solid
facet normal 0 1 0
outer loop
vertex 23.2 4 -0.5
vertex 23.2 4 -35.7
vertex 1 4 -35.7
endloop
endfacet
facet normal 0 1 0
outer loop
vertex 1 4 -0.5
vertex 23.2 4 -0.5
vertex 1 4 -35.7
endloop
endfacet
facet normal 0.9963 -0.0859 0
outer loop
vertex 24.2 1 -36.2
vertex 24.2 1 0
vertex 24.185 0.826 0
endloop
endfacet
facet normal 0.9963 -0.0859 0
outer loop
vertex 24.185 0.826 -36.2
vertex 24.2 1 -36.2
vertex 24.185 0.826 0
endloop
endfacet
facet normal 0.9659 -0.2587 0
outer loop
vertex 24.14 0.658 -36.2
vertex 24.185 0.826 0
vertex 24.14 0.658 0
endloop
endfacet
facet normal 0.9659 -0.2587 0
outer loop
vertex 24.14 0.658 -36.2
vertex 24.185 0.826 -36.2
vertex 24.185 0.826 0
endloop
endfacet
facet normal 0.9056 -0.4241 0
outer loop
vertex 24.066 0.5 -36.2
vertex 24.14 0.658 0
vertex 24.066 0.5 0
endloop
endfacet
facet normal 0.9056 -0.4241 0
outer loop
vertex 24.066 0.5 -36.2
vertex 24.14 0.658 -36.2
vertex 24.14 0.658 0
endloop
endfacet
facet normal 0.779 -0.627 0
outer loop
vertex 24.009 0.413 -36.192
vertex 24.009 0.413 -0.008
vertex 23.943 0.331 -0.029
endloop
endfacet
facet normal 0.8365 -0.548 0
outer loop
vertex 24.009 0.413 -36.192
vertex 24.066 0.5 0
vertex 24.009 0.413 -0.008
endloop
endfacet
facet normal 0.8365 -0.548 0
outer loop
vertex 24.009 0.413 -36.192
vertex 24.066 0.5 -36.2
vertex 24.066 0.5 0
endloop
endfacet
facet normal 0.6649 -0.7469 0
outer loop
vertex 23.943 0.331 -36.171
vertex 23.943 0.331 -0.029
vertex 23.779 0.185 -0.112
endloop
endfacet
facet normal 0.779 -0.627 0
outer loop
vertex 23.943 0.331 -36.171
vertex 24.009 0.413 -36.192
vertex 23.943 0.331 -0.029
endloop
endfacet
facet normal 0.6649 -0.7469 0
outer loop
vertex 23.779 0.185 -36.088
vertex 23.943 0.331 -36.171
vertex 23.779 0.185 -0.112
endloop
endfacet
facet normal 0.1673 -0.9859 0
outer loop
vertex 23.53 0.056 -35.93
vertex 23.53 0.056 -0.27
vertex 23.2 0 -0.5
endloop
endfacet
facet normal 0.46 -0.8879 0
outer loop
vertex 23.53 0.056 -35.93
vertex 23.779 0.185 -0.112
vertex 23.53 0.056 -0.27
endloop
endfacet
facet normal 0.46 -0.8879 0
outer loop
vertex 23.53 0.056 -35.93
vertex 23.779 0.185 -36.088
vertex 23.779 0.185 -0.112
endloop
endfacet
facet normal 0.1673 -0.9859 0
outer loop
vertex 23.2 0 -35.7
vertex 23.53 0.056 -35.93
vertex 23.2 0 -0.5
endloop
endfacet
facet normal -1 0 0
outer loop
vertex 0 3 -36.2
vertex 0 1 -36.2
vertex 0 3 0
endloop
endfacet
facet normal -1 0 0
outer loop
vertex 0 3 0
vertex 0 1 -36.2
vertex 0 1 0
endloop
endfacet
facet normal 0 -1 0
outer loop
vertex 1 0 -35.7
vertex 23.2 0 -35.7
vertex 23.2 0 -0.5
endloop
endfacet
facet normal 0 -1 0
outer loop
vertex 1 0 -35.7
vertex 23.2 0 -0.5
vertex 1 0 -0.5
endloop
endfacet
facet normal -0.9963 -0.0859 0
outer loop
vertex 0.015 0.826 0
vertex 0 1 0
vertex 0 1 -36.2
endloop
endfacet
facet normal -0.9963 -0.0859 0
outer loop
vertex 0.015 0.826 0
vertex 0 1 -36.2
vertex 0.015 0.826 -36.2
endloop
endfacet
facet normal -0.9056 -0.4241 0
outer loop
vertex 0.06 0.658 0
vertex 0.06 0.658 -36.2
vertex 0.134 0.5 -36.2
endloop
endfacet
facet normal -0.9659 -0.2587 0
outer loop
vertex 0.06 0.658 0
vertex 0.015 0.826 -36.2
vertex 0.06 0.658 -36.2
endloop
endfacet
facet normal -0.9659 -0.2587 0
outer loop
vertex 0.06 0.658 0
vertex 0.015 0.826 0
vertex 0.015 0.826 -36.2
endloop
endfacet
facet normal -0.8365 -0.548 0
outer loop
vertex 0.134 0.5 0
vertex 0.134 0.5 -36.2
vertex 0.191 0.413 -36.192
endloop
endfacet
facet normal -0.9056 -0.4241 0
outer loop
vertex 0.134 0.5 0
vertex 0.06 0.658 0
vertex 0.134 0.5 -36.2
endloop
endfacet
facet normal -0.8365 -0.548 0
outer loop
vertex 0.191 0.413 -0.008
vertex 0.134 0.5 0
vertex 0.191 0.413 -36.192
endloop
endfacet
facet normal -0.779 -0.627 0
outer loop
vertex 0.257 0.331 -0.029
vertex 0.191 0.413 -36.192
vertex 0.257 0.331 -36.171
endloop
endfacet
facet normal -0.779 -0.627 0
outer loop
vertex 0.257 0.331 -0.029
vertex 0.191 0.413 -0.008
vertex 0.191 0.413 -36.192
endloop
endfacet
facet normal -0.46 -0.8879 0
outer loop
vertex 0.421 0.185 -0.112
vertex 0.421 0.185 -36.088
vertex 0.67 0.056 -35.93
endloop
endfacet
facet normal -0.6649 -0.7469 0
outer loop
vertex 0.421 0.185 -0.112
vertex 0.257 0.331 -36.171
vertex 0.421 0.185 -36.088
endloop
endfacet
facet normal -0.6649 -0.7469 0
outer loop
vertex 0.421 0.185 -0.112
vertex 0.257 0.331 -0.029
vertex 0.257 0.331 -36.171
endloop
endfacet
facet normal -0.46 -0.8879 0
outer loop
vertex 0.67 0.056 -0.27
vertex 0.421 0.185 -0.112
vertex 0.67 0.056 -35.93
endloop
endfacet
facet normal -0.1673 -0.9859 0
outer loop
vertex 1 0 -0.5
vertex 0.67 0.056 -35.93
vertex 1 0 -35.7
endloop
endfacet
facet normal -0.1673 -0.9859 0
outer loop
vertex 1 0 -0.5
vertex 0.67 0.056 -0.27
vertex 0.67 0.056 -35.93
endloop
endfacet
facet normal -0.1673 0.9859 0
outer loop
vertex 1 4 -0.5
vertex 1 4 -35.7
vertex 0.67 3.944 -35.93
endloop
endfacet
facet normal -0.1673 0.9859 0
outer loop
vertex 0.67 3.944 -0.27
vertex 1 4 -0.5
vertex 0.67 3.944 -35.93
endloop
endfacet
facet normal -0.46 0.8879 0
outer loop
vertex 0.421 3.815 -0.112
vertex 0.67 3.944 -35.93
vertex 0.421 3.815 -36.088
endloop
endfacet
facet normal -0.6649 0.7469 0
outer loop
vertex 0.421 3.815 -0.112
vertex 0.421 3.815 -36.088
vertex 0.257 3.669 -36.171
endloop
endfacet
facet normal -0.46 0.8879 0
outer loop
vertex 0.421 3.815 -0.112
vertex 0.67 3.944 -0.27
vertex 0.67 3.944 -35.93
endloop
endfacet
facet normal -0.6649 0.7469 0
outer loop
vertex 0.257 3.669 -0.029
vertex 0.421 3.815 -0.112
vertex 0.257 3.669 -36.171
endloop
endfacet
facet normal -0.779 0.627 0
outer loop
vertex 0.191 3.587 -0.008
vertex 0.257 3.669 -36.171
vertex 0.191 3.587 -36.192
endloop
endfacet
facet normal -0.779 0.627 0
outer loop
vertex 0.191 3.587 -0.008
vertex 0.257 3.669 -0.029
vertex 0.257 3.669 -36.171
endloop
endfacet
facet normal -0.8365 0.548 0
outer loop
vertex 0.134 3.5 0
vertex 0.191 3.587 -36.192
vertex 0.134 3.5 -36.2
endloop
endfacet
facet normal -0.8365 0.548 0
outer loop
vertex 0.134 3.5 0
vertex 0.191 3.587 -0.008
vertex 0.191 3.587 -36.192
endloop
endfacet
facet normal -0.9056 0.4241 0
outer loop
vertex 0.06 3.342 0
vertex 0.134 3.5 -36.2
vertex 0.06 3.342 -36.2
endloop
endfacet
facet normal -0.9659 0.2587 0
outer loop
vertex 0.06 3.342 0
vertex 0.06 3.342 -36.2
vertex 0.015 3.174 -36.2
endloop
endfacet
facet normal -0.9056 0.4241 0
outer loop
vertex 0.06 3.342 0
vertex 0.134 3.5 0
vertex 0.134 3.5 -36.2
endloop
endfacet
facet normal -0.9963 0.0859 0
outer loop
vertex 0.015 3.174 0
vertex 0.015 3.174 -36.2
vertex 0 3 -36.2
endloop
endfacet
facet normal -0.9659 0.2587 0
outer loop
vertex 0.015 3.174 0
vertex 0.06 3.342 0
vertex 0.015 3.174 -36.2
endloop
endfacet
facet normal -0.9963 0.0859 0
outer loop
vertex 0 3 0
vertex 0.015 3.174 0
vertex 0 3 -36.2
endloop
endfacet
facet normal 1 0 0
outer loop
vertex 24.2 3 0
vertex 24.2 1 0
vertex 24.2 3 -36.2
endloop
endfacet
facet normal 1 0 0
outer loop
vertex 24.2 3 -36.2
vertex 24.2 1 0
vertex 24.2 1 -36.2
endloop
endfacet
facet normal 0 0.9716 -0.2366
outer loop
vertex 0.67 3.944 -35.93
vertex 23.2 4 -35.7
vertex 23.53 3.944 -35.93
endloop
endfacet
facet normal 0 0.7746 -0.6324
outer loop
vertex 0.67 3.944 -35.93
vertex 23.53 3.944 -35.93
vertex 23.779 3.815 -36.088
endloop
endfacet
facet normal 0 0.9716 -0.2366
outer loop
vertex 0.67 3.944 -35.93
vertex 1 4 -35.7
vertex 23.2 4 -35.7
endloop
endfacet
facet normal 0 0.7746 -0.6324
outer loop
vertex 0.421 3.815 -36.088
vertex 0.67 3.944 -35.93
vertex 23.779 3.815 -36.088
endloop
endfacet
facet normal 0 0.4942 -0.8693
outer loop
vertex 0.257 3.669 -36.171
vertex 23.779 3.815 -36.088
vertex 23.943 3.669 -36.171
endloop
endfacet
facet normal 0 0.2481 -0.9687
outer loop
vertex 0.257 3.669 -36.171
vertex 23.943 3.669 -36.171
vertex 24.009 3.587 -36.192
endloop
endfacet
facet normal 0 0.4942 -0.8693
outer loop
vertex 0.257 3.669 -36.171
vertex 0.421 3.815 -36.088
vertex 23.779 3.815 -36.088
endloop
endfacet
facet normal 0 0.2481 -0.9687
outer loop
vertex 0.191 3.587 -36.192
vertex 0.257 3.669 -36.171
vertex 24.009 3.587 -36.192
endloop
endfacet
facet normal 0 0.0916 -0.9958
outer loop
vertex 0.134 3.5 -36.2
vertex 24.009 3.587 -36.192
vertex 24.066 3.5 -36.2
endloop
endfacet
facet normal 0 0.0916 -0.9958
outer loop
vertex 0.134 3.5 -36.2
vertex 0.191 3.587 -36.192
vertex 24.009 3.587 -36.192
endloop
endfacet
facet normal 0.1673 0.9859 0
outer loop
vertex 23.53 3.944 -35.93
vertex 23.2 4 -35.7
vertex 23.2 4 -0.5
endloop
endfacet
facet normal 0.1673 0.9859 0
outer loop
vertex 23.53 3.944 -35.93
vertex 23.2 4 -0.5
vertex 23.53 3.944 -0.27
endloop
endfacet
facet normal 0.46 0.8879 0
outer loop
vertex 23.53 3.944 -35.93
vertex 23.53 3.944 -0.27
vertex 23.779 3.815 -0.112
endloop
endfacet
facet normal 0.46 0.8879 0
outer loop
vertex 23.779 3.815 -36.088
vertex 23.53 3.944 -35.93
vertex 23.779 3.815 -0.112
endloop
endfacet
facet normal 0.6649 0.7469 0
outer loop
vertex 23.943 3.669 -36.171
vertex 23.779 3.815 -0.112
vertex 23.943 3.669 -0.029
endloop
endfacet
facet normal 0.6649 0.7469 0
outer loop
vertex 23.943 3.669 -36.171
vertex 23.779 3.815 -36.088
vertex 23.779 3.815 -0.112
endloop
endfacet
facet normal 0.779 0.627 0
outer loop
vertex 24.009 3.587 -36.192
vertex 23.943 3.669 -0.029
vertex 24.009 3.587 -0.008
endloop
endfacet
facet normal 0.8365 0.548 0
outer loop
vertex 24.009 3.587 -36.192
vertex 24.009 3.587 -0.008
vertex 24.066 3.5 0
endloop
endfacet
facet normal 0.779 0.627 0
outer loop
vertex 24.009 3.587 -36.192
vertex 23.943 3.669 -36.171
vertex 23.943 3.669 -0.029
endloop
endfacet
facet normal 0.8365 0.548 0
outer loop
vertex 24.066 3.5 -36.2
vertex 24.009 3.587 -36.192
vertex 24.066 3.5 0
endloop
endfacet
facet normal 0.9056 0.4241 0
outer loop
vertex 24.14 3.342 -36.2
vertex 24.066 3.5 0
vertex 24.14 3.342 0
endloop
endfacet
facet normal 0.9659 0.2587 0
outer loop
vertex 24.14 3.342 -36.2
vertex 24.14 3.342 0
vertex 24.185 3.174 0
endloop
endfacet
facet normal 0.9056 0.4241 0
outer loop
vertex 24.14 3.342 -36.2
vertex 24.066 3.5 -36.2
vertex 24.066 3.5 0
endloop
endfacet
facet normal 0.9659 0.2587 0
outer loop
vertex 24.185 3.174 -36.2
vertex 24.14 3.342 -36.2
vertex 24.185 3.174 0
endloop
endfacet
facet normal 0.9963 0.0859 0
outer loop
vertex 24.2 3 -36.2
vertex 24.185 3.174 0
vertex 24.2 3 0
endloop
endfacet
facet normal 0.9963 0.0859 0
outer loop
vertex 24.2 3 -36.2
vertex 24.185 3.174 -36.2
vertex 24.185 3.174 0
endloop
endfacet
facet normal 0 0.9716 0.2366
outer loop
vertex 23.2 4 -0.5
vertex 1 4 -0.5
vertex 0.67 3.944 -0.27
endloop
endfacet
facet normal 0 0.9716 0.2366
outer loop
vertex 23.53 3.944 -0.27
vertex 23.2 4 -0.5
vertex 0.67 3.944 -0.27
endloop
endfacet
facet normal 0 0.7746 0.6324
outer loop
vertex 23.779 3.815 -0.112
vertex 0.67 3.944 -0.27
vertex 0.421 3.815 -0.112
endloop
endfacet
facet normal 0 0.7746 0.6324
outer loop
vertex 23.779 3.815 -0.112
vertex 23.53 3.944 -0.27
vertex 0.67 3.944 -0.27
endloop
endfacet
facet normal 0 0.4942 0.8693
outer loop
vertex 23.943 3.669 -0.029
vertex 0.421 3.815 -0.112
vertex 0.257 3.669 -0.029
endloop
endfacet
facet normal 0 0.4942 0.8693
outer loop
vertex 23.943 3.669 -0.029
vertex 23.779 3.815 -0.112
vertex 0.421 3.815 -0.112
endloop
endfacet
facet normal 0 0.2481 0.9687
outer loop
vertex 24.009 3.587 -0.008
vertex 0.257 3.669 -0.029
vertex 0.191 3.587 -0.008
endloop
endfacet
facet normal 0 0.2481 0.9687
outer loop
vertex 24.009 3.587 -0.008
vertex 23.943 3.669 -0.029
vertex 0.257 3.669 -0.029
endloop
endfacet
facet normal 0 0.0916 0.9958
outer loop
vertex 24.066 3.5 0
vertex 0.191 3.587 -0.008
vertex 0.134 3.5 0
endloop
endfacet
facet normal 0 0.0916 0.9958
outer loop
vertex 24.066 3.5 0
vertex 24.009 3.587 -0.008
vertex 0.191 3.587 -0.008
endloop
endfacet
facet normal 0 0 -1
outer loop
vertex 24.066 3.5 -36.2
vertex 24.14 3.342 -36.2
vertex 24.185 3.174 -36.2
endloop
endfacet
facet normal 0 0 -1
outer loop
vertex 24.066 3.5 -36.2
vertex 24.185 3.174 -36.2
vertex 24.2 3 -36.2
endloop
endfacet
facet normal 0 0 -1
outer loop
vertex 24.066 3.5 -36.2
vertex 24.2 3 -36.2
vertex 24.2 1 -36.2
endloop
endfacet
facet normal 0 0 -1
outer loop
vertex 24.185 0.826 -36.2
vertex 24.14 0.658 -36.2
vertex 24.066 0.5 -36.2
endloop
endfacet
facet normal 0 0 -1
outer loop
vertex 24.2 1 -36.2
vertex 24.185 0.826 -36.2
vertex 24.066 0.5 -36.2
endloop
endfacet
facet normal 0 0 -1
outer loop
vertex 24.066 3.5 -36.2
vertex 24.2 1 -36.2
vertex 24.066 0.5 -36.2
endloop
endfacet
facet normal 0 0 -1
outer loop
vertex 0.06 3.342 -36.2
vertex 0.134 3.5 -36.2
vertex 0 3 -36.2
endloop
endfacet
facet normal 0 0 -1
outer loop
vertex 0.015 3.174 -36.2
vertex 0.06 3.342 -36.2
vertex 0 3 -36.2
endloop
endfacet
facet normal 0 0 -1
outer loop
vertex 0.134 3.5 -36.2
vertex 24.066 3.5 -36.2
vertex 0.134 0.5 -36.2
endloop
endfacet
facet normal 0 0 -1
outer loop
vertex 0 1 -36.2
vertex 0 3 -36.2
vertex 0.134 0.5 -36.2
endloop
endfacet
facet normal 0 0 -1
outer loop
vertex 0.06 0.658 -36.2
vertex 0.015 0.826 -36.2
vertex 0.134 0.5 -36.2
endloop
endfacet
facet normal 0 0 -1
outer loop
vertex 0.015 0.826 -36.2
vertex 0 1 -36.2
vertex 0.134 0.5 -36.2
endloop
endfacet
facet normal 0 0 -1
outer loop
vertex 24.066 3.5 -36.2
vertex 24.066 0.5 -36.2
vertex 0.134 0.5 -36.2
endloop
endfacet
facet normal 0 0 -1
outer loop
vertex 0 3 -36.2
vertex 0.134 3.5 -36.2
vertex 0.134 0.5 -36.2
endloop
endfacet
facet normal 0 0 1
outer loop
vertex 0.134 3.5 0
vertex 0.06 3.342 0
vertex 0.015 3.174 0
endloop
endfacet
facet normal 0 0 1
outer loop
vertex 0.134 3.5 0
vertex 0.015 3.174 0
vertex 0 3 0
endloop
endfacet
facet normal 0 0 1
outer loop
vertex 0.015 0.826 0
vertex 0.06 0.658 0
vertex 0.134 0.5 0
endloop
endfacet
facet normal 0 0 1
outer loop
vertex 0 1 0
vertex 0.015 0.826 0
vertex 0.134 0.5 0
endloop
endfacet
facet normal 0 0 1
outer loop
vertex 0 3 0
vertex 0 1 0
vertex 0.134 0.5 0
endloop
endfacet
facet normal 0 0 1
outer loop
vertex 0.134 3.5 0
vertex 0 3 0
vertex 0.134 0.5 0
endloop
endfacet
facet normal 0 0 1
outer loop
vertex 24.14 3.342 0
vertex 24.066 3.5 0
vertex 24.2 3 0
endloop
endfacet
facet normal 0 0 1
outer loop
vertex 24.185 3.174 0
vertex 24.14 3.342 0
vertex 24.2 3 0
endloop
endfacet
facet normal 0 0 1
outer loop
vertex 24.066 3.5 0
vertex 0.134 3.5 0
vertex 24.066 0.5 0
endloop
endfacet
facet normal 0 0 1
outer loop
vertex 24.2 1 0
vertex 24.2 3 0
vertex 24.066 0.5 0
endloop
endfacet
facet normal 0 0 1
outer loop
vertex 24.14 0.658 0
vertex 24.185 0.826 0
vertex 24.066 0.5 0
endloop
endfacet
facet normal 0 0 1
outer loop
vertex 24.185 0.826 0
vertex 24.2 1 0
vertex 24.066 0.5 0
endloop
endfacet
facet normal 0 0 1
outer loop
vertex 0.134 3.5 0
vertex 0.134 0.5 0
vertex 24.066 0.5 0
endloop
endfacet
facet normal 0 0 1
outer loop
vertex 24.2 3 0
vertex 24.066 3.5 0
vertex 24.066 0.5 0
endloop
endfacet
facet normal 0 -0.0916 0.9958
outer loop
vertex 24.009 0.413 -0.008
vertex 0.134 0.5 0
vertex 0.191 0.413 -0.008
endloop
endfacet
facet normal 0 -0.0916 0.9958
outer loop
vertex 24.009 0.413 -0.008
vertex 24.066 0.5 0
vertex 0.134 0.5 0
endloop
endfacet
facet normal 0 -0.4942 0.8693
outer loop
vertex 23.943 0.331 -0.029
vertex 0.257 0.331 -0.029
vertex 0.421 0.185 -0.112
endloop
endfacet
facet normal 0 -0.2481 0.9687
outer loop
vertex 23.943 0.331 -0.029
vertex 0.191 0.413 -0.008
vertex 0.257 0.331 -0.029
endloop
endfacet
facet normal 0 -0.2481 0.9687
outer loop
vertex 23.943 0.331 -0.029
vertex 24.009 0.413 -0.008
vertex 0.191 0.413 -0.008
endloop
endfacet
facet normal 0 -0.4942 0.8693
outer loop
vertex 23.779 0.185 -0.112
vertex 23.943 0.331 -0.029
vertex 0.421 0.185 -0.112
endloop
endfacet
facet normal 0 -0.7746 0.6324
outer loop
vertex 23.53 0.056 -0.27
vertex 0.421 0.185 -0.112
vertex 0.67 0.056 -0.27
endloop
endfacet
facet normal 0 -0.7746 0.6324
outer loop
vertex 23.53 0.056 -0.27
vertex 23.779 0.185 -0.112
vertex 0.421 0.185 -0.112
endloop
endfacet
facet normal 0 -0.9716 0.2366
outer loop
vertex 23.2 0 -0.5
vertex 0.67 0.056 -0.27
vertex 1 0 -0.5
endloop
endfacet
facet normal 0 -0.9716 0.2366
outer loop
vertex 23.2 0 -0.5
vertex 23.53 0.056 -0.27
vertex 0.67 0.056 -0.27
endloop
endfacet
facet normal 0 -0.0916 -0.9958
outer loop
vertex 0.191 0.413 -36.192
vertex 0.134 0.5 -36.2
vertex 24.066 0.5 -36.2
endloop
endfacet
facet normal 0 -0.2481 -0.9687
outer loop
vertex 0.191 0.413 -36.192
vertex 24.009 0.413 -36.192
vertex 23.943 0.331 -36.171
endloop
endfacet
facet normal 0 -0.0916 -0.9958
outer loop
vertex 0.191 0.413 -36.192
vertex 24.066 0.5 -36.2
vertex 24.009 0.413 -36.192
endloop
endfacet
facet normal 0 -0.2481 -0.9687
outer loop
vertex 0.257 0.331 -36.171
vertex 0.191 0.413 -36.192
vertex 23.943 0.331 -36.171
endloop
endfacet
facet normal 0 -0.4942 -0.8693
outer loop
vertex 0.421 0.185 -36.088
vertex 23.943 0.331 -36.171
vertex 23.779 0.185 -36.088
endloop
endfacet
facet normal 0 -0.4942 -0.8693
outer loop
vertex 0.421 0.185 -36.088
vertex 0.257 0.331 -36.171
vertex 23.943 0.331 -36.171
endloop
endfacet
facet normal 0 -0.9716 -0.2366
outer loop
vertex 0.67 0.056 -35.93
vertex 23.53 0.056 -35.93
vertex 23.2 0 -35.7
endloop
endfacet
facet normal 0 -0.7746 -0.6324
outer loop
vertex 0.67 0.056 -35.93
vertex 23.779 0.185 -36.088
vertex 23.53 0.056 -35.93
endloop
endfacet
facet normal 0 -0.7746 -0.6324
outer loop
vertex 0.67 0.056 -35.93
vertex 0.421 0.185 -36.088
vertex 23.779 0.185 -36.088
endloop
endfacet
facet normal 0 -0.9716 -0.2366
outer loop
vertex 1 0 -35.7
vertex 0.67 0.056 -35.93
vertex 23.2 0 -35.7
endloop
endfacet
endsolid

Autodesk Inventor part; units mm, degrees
ref_plane "YZ Plane" through (0, 0, 0) normal (1, 0, 0) x (0, 1, 0)
sketch "Sketch1" plane through (0, 0, 0) normal (0, 1, 0) x (-1, 0, 0)
  line L0 (0, 0) -> (-24.2, 0)
  line L1 (-24.2, 0) -> (-24.2, -36.2)
  line L2 (-24.2, -36.2) -> (0, -36.2)
  line L3 (0, -36.2) -> (0, 0)
  dimension "d0" = 24.2
  dimension "d1" = 36.2
extrude "Extrusion1" add sketch "Sketch1" along normal blind 4
fillet "Fillet1" radius 1 4 edges at (0, 4, -18.1) (0, 0, -18.1) (24.2, 4, -18.1) (24.2, 0, -18.1)
fillet "Fillet1" radius 0.5 4 edges at (12.1, 4, -36.2) (12.1, 0, -36.2) (12.1, 4, 0) (12.1, 0, 0)
ref_plane "Work Plane1" through (12.1, 1, -36.2) normal (1, 0, 0) x (0, 0, -1)
ref_plane "Work Plane2" through (0.134, 3.5, -18.1) normal (0, 0, 1) x (1, 0, 0)
properties part number "Battery_402535"
